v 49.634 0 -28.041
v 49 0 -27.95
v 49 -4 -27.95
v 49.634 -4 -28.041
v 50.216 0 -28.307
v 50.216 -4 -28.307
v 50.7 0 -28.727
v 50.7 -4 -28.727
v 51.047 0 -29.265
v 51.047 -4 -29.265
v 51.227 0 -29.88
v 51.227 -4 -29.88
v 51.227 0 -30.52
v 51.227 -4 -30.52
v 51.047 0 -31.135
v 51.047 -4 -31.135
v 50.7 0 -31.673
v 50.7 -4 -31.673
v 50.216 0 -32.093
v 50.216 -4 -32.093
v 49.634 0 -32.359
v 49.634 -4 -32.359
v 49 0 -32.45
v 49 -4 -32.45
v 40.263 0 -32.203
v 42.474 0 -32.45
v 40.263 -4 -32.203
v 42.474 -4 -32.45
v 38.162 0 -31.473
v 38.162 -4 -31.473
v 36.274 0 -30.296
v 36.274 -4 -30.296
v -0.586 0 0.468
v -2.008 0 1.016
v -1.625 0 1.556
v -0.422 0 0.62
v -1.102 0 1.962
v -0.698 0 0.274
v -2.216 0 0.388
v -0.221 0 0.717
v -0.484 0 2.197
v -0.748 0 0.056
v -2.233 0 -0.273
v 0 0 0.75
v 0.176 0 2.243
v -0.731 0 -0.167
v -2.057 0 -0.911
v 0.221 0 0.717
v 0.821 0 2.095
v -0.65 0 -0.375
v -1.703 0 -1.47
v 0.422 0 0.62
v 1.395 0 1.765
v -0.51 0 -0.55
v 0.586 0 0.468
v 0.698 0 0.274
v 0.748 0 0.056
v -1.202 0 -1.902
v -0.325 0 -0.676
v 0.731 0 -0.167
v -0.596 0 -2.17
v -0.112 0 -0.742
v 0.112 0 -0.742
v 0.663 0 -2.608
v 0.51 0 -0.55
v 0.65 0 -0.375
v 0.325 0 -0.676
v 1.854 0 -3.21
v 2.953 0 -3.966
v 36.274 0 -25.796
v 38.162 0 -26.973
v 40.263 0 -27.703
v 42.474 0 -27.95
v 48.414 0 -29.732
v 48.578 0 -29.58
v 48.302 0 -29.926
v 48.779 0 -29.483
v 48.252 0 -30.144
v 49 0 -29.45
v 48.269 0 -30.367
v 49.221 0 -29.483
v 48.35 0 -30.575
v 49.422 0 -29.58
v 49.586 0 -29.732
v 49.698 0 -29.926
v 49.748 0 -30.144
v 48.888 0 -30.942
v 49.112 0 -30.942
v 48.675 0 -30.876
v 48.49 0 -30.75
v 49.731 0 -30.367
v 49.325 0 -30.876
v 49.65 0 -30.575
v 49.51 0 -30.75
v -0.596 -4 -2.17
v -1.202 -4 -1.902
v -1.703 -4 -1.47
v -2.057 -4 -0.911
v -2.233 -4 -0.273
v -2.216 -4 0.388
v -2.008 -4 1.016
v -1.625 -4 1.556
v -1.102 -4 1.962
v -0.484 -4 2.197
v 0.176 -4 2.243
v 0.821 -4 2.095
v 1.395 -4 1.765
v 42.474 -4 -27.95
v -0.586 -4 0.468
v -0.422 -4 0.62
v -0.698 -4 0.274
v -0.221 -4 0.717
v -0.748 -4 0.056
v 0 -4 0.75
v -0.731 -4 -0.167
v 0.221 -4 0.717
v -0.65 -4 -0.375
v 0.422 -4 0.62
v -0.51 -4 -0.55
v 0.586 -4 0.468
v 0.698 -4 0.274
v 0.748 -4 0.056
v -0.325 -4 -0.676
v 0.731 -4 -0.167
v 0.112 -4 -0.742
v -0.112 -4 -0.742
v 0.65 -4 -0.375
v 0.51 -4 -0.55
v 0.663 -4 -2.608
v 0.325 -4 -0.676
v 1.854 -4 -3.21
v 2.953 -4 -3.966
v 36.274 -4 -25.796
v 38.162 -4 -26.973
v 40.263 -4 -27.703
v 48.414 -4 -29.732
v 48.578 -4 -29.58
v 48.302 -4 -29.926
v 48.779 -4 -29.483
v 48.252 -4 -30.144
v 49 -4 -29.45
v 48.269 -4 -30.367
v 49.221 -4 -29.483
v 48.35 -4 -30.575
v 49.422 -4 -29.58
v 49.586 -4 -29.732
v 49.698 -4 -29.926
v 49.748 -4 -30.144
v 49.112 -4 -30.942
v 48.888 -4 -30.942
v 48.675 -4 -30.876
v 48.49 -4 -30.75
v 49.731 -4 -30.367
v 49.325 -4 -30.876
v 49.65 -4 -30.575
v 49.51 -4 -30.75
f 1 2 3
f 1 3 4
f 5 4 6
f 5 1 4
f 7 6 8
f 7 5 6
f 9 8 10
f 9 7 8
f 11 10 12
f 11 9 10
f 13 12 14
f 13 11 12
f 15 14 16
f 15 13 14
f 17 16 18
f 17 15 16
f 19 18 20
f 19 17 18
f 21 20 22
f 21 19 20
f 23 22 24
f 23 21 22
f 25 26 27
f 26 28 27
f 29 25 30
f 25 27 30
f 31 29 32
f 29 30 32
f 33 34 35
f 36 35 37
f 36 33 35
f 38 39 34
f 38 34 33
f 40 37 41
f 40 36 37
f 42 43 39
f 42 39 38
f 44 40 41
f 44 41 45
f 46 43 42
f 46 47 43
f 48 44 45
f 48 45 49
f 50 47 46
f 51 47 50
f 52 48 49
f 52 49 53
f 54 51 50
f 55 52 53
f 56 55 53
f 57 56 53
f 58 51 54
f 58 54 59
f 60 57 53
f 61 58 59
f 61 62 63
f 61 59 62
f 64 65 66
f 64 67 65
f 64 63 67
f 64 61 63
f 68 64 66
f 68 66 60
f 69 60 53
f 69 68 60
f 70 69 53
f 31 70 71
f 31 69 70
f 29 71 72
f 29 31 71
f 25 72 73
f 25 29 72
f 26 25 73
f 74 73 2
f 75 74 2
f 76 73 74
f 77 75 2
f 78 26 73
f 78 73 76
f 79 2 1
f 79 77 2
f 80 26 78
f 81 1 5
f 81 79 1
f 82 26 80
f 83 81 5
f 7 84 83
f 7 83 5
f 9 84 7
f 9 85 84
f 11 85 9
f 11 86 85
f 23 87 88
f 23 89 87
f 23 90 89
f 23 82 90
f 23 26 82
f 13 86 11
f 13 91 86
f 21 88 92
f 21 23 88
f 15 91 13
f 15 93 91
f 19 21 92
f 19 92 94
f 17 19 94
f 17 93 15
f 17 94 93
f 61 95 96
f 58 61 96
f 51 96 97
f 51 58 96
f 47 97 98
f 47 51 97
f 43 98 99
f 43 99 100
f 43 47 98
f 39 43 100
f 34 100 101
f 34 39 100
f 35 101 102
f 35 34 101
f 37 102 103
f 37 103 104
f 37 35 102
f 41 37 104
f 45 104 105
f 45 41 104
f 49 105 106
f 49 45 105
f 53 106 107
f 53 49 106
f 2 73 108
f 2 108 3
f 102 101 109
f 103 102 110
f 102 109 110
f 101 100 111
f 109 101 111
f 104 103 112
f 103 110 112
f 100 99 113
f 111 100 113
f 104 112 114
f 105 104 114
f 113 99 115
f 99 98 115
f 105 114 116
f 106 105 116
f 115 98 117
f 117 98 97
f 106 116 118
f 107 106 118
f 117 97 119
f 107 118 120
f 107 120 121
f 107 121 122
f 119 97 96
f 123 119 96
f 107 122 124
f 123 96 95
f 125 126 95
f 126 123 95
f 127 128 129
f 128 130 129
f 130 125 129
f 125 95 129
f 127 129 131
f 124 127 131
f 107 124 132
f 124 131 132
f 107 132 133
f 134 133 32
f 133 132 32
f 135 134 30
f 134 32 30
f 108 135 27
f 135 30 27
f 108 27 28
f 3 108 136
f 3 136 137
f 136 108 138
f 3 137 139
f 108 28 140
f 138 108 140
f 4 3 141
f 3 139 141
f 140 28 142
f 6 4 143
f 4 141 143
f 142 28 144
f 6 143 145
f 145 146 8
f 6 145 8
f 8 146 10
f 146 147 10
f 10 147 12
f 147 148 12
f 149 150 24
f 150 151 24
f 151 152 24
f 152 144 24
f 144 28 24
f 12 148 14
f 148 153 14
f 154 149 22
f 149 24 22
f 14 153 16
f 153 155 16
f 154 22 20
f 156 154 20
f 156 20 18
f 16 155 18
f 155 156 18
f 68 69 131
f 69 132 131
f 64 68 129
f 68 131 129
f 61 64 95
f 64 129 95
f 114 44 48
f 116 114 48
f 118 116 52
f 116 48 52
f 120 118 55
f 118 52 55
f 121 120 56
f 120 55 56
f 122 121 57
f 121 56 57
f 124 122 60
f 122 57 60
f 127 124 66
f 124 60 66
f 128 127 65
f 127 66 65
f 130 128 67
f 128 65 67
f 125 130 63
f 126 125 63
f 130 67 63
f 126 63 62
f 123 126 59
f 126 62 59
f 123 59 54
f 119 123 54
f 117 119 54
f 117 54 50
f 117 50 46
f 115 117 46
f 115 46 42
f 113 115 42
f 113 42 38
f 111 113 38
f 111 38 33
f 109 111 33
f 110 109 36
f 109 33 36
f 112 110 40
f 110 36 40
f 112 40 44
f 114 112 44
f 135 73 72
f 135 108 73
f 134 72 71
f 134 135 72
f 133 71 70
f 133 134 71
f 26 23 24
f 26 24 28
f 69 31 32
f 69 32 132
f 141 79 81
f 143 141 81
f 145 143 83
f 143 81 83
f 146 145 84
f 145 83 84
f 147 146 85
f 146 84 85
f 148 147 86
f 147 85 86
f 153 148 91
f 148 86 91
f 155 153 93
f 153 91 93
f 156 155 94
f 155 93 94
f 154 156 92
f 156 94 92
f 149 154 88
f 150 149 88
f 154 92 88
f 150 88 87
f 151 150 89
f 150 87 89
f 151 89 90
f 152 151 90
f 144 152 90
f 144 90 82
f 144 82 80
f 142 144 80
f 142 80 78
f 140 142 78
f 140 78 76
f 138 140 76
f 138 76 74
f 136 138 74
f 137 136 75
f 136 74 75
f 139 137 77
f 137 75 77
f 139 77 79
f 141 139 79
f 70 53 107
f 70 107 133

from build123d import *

# Parameters (mm, degrees)
SKETCH1_R           = 0.75
BOSS_EXTRUDE1_DEPTH = 4
FILLET1_R           = 10


with BuildPart() as part:
    # Sketch1 → Boss-Extrude1 (new body)
    with BuildSketch(Plane(origin=(0, 0, 0), x_dir=(1, 0, 0), z_dir=(0, 1, 0))):
        with BuildLine():
            Line((49, 32.45), (39, 32.45))
            Line((39, 32.45), (0.6574204, 2.151812821))
            ThreePointArc((0.6574204, 2.151812821), (-2.211145355, -0.416336667), (1.394986025, -1.765365115))
            Line((1.394986025, -1.765365115), (39, 27.95))
            Line((39, 27.95), (49, 27.95))
            ThreePointArc((49, 27.95), (51.25, 30.2), (49, 32.45))
        make_face()
        with Locations(Location((49, 30.2, 0), (0, 0, 270))):
            Circle(SKETCH1_R, mode=Mode.SUBTRACT)
        with Locations(Location((0, 0, 0), (0, 0, 270))):
            Circle(SKETCH1_R, mode=Mode.SUBTRACT)
    extrude(amount=-BOSS_EXTRUDE1_DEPTH)

    # Fillet1
    fillet1_edges = [part.edges().sort_by_distance(p)[0] for p in [
        (39, -2, -27.95),
        (0.6574204, -2, -2.151812821),
        (39, -2, -32.45),
    ]]
    fillet(fillet1_edges, radius=FILLET1_R)


solid = part.part
